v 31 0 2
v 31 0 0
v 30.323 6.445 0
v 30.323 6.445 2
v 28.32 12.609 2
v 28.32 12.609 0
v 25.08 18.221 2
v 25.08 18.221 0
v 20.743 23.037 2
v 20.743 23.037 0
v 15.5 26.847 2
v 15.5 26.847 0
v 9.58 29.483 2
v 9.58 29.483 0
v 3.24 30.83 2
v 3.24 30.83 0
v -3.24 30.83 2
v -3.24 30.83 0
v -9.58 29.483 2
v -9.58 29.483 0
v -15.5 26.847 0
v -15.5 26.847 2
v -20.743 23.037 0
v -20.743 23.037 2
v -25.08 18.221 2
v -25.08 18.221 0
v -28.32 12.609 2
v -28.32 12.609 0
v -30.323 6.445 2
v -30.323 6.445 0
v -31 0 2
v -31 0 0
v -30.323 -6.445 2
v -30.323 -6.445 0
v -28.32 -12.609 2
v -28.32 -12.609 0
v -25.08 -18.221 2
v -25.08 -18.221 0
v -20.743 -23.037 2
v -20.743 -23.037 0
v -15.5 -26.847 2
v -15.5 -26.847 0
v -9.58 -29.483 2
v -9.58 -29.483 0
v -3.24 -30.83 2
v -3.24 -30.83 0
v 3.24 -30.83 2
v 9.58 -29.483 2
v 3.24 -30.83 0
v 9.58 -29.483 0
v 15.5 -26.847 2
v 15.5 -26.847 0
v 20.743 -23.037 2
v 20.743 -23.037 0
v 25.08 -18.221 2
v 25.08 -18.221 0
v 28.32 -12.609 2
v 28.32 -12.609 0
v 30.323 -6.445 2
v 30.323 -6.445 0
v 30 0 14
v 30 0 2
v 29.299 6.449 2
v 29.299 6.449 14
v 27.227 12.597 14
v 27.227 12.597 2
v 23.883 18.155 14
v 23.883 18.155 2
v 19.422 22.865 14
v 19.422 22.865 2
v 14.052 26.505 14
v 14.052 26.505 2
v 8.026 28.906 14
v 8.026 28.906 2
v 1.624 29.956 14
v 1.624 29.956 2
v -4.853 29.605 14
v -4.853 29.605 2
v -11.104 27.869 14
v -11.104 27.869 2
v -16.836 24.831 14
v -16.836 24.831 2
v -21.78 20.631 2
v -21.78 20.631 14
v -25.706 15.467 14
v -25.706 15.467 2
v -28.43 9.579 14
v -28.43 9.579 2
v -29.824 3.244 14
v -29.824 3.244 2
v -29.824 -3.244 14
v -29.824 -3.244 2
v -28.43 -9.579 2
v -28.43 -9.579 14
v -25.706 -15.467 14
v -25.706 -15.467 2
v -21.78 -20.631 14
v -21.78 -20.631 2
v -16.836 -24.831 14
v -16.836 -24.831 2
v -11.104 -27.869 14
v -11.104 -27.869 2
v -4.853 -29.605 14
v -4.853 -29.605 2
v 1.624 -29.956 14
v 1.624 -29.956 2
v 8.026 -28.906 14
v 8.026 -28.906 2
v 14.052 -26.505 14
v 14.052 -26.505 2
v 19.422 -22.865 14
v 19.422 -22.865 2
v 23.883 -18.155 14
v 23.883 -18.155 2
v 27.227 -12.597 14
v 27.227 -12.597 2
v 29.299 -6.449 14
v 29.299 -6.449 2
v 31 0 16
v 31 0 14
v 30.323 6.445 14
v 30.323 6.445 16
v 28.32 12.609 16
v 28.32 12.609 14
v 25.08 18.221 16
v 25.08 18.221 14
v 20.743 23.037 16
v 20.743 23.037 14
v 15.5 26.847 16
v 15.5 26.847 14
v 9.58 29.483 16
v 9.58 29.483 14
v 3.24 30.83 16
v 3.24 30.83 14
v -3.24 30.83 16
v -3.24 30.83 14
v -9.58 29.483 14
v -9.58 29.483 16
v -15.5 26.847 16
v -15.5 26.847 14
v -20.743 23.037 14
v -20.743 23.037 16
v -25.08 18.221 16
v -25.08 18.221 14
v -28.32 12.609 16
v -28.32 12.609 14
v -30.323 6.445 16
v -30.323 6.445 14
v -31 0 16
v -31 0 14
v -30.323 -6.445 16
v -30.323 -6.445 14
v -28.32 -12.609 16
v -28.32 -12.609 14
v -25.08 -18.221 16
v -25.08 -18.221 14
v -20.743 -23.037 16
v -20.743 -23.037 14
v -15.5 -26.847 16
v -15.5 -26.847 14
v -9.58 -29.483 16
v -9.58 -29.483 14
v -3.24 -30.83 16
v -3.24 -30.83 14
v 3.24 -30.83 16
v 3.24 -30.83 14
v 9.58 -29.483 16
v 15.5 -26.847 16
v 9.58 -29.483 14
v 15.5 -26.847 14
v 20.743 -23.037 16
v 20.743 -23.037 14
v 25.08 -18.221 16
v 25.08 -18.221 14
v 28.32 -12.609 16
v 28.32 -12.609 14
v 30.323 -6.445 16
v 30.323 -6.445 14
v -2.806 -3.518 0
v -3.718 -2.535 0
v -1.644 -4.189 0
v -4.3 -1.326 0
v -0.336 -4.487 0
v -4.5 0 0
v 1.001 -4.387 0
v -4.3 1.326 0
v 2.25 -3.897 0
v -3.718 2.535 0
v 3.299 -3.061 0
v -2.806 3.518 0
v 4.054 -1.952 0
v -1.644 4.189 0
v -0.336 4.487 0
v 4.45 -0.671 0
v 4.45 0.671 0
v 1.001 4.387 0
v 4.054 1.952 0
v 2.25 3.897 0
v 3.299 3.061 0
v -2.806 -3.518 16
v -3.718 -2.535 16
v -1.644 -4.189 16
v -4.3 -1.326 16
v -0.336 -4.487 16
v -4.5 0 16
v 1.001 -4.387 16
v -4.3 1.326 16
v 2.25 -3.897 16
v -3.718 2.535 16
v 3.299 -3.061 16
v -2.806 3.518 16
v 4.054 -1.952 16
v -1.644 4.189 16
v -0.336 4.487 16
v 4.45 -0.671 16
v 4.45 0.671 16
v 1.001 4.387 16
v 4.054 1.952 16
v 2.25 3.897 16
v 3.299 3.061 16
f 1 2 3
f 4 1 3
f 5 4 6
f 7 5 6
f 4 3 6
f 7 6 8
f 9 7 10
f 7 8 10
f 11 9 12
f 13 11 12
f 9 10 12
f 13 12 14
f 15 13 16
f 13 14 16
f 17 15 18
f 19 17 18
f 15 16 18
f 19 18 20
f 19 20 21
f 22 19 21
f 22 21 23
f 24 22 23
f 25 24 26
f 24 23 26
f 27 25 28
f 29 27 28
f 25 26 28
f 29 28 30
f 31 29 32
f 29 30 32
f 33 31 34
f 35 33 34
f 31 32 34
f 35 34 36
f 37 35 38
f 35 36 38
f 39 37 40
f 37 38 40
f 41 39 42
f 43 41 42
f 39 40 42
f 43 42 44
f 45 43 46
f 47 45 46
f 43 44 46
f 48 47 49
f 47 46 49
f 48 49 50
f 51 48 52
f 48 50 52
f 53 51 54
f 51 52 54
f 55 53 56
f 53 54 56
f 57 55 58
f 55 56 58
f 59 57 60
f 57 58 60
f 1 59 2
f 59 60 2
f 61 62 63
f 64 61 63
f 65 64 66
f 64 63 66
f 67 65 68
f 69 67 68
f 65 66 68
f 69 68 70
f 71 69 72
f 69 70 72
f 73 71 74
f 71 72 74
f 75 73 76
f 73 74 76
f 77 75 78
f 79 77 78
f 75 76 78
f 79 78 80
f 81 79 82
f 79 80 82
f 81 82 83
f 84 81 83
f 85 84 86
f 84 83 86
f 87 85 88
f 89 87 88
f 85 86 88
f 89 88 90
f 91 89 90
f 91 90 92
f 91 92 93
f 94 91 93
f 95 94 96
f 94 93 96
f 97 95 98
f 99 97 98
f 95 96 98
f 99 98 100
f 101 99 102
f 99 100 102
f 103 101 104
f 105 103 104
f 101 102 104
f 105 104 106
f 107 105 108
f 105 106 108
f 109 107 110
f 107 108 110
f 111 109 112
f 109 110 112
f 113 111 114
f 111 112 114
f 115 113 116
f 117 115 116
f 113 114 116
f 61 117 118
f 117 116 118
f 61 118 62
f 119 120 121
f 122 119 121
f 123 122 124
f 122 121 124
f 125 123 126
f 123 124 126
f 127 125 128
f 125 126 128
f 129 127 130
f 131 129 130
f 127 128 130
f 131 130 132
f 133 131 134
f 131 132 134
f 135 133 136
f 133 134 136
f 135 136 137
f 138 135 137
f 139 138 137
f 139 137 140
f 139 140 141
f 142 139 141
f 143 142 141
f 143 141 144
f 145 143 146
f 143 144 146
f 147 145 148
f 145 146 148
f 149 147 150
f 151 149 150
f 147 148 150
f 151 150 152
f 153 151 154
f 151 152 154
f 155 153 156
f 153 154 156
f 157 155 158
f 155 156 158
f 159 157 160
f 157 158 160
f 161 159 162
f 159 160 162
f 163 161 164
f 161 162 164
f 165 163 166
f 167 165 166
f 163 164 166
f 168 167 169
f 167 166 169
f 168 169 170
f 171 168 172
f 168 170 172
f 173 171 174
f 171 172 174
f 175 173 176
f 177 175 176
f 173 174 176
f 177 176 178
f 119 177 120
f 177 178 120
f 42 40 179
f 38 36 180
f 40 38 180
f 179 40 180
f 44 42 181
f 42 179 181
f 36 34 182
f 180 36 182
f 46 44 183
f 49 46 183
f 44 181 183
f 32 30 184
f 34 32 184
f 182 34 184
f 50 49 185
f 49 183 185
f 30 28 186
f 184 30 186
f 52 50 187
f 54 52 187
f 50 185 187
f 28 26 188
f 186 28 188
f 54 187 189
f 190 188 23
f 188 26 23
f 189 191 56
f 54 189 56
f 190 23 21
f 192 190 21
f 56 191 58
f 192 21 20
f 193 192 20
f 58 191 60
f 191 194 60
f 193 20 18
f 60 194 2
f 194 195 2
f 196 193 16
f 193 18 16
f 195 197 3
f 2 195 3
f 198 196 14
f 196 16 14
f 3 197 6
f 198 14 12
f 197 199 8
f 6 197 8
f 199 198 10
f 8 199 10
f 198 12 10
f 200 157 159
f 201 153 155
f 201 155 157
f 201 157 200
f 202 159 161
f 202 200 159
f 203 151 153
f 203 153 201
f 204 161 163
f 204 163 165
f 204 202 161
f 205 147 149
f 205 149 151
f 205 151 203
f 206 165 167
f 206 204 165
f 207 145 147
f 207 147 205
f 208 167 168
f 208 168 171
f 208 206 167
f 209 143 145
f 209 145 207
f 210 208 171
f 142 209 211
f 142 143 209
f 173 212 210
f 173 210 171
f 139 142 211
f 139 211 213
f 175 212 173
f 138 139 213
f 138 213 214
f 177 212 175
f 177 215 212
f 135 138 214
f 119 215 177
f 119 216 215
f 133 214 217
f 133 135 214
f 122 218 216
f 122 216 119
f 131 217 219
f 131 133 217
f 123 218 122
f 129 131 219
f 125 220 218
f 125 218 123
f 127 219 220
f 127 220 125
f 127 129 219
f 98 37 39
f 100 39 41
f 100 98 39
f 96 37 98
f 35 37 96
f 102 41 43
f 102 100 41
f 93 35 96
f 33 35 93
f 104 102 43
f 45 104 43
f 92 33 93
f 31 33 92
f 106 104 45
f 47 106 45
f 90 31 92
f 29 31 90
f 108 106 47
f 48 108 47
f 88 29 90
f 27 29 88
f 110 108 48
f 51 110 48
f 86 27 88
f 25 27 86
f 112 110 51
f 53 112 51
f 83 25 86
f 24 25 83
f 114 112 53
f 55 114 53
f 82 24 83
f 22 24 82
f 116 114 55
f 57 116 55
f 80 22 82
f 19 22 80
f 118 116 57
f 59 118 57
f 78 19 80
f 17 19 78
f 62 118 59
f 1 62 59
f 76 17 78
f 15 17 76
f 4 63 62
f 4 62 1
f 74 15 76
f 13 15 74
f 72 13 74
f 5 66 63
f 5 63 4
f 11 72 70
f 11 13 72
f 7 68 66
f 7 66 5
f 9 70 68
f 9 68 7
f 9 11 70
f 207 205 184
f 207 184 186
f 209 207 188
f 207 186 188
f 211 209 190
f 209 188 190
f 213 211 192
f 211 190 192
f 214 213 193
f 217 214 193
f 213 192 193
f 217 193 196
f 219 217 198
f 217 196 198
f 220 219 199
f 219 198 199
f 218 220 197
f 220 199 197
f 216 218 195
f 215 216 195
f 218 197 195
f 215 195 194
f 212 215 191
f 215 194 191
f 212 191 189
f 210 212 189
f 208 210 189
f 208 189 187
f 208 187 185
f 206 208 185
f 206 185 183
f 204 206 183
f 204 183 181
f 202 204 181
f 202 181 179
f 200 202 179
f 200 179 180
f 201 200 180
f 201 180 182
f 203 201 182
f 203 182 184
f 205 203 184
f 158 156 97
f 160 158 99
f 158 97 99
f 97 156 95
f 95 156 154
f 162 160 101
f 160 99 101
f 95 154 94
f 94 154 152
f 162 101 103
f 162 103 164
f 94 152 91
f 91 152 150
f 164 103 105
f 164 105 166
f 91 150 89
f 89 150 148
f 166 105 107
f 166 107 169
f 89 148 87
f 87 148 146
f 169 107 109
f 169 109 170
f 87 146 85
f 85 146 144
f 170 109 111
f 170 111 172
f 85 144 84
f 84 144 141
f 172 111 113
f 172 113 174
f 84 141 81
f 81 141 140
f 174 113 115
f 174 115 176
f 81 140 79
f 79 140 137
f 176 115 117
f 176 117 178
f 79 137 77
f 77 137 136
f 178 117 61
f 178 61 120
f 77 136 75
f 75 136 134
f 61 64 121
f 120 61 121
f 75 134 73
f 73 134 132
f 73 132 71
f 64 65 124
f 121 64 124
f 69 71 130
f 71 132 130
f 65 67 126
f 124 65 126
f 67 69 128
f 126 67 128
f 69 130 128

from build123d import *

# Parameters (mm, degrees)
SKETCH_1_R          = 31
EXTRUDE_1_DEPTH     = 2
SKETCH_2_R          = 30
EXTRUDE_2_DEPTH     = 12
SKETCH_3_R          = 31
EXTRUDE_3_DEPTH     = 2
SKETCH_4_R          = 4.5
CUT_EXTRUDE_1_DEPTH = 47.669047558


with BuildPart() as part:
    # 草图1 → 拉伸1 (new body)
    with BuildSketch(Plane.XY):
        Circle(SKETCH_1_R)
    extrude(amount=EXTRUDE_1_DEPTH)

    # 草图2 → 拉伸2 (add)
    with BuildSketch(Plane.XY.offset(2)):
        Circle(SKETCH_2_R)
    extrude(amount=EXTRUDE_2_DEPTH)

    # 草图3 → 拉伸3 (add)
    with BuildSketch(Plane.XY.offset(14)):
        Circle(SKETCH_3_R)
    extrude(amount=EXTRUDE_3_DEPTH)

    # 草图4 → 切除-拉伸1 (cut, through all)
    with BuildSketch(Plane(origin=(0, 0, 0), x_dir=(-1, 0, 0), z_dir=(0, 0, -1))):
        Circle(SKETCH_4_R)
    extrude(amount=-CUT_EXTRUDE_1_DEPTH, mode=Mode.SUBTRACT)


solid = part.part
